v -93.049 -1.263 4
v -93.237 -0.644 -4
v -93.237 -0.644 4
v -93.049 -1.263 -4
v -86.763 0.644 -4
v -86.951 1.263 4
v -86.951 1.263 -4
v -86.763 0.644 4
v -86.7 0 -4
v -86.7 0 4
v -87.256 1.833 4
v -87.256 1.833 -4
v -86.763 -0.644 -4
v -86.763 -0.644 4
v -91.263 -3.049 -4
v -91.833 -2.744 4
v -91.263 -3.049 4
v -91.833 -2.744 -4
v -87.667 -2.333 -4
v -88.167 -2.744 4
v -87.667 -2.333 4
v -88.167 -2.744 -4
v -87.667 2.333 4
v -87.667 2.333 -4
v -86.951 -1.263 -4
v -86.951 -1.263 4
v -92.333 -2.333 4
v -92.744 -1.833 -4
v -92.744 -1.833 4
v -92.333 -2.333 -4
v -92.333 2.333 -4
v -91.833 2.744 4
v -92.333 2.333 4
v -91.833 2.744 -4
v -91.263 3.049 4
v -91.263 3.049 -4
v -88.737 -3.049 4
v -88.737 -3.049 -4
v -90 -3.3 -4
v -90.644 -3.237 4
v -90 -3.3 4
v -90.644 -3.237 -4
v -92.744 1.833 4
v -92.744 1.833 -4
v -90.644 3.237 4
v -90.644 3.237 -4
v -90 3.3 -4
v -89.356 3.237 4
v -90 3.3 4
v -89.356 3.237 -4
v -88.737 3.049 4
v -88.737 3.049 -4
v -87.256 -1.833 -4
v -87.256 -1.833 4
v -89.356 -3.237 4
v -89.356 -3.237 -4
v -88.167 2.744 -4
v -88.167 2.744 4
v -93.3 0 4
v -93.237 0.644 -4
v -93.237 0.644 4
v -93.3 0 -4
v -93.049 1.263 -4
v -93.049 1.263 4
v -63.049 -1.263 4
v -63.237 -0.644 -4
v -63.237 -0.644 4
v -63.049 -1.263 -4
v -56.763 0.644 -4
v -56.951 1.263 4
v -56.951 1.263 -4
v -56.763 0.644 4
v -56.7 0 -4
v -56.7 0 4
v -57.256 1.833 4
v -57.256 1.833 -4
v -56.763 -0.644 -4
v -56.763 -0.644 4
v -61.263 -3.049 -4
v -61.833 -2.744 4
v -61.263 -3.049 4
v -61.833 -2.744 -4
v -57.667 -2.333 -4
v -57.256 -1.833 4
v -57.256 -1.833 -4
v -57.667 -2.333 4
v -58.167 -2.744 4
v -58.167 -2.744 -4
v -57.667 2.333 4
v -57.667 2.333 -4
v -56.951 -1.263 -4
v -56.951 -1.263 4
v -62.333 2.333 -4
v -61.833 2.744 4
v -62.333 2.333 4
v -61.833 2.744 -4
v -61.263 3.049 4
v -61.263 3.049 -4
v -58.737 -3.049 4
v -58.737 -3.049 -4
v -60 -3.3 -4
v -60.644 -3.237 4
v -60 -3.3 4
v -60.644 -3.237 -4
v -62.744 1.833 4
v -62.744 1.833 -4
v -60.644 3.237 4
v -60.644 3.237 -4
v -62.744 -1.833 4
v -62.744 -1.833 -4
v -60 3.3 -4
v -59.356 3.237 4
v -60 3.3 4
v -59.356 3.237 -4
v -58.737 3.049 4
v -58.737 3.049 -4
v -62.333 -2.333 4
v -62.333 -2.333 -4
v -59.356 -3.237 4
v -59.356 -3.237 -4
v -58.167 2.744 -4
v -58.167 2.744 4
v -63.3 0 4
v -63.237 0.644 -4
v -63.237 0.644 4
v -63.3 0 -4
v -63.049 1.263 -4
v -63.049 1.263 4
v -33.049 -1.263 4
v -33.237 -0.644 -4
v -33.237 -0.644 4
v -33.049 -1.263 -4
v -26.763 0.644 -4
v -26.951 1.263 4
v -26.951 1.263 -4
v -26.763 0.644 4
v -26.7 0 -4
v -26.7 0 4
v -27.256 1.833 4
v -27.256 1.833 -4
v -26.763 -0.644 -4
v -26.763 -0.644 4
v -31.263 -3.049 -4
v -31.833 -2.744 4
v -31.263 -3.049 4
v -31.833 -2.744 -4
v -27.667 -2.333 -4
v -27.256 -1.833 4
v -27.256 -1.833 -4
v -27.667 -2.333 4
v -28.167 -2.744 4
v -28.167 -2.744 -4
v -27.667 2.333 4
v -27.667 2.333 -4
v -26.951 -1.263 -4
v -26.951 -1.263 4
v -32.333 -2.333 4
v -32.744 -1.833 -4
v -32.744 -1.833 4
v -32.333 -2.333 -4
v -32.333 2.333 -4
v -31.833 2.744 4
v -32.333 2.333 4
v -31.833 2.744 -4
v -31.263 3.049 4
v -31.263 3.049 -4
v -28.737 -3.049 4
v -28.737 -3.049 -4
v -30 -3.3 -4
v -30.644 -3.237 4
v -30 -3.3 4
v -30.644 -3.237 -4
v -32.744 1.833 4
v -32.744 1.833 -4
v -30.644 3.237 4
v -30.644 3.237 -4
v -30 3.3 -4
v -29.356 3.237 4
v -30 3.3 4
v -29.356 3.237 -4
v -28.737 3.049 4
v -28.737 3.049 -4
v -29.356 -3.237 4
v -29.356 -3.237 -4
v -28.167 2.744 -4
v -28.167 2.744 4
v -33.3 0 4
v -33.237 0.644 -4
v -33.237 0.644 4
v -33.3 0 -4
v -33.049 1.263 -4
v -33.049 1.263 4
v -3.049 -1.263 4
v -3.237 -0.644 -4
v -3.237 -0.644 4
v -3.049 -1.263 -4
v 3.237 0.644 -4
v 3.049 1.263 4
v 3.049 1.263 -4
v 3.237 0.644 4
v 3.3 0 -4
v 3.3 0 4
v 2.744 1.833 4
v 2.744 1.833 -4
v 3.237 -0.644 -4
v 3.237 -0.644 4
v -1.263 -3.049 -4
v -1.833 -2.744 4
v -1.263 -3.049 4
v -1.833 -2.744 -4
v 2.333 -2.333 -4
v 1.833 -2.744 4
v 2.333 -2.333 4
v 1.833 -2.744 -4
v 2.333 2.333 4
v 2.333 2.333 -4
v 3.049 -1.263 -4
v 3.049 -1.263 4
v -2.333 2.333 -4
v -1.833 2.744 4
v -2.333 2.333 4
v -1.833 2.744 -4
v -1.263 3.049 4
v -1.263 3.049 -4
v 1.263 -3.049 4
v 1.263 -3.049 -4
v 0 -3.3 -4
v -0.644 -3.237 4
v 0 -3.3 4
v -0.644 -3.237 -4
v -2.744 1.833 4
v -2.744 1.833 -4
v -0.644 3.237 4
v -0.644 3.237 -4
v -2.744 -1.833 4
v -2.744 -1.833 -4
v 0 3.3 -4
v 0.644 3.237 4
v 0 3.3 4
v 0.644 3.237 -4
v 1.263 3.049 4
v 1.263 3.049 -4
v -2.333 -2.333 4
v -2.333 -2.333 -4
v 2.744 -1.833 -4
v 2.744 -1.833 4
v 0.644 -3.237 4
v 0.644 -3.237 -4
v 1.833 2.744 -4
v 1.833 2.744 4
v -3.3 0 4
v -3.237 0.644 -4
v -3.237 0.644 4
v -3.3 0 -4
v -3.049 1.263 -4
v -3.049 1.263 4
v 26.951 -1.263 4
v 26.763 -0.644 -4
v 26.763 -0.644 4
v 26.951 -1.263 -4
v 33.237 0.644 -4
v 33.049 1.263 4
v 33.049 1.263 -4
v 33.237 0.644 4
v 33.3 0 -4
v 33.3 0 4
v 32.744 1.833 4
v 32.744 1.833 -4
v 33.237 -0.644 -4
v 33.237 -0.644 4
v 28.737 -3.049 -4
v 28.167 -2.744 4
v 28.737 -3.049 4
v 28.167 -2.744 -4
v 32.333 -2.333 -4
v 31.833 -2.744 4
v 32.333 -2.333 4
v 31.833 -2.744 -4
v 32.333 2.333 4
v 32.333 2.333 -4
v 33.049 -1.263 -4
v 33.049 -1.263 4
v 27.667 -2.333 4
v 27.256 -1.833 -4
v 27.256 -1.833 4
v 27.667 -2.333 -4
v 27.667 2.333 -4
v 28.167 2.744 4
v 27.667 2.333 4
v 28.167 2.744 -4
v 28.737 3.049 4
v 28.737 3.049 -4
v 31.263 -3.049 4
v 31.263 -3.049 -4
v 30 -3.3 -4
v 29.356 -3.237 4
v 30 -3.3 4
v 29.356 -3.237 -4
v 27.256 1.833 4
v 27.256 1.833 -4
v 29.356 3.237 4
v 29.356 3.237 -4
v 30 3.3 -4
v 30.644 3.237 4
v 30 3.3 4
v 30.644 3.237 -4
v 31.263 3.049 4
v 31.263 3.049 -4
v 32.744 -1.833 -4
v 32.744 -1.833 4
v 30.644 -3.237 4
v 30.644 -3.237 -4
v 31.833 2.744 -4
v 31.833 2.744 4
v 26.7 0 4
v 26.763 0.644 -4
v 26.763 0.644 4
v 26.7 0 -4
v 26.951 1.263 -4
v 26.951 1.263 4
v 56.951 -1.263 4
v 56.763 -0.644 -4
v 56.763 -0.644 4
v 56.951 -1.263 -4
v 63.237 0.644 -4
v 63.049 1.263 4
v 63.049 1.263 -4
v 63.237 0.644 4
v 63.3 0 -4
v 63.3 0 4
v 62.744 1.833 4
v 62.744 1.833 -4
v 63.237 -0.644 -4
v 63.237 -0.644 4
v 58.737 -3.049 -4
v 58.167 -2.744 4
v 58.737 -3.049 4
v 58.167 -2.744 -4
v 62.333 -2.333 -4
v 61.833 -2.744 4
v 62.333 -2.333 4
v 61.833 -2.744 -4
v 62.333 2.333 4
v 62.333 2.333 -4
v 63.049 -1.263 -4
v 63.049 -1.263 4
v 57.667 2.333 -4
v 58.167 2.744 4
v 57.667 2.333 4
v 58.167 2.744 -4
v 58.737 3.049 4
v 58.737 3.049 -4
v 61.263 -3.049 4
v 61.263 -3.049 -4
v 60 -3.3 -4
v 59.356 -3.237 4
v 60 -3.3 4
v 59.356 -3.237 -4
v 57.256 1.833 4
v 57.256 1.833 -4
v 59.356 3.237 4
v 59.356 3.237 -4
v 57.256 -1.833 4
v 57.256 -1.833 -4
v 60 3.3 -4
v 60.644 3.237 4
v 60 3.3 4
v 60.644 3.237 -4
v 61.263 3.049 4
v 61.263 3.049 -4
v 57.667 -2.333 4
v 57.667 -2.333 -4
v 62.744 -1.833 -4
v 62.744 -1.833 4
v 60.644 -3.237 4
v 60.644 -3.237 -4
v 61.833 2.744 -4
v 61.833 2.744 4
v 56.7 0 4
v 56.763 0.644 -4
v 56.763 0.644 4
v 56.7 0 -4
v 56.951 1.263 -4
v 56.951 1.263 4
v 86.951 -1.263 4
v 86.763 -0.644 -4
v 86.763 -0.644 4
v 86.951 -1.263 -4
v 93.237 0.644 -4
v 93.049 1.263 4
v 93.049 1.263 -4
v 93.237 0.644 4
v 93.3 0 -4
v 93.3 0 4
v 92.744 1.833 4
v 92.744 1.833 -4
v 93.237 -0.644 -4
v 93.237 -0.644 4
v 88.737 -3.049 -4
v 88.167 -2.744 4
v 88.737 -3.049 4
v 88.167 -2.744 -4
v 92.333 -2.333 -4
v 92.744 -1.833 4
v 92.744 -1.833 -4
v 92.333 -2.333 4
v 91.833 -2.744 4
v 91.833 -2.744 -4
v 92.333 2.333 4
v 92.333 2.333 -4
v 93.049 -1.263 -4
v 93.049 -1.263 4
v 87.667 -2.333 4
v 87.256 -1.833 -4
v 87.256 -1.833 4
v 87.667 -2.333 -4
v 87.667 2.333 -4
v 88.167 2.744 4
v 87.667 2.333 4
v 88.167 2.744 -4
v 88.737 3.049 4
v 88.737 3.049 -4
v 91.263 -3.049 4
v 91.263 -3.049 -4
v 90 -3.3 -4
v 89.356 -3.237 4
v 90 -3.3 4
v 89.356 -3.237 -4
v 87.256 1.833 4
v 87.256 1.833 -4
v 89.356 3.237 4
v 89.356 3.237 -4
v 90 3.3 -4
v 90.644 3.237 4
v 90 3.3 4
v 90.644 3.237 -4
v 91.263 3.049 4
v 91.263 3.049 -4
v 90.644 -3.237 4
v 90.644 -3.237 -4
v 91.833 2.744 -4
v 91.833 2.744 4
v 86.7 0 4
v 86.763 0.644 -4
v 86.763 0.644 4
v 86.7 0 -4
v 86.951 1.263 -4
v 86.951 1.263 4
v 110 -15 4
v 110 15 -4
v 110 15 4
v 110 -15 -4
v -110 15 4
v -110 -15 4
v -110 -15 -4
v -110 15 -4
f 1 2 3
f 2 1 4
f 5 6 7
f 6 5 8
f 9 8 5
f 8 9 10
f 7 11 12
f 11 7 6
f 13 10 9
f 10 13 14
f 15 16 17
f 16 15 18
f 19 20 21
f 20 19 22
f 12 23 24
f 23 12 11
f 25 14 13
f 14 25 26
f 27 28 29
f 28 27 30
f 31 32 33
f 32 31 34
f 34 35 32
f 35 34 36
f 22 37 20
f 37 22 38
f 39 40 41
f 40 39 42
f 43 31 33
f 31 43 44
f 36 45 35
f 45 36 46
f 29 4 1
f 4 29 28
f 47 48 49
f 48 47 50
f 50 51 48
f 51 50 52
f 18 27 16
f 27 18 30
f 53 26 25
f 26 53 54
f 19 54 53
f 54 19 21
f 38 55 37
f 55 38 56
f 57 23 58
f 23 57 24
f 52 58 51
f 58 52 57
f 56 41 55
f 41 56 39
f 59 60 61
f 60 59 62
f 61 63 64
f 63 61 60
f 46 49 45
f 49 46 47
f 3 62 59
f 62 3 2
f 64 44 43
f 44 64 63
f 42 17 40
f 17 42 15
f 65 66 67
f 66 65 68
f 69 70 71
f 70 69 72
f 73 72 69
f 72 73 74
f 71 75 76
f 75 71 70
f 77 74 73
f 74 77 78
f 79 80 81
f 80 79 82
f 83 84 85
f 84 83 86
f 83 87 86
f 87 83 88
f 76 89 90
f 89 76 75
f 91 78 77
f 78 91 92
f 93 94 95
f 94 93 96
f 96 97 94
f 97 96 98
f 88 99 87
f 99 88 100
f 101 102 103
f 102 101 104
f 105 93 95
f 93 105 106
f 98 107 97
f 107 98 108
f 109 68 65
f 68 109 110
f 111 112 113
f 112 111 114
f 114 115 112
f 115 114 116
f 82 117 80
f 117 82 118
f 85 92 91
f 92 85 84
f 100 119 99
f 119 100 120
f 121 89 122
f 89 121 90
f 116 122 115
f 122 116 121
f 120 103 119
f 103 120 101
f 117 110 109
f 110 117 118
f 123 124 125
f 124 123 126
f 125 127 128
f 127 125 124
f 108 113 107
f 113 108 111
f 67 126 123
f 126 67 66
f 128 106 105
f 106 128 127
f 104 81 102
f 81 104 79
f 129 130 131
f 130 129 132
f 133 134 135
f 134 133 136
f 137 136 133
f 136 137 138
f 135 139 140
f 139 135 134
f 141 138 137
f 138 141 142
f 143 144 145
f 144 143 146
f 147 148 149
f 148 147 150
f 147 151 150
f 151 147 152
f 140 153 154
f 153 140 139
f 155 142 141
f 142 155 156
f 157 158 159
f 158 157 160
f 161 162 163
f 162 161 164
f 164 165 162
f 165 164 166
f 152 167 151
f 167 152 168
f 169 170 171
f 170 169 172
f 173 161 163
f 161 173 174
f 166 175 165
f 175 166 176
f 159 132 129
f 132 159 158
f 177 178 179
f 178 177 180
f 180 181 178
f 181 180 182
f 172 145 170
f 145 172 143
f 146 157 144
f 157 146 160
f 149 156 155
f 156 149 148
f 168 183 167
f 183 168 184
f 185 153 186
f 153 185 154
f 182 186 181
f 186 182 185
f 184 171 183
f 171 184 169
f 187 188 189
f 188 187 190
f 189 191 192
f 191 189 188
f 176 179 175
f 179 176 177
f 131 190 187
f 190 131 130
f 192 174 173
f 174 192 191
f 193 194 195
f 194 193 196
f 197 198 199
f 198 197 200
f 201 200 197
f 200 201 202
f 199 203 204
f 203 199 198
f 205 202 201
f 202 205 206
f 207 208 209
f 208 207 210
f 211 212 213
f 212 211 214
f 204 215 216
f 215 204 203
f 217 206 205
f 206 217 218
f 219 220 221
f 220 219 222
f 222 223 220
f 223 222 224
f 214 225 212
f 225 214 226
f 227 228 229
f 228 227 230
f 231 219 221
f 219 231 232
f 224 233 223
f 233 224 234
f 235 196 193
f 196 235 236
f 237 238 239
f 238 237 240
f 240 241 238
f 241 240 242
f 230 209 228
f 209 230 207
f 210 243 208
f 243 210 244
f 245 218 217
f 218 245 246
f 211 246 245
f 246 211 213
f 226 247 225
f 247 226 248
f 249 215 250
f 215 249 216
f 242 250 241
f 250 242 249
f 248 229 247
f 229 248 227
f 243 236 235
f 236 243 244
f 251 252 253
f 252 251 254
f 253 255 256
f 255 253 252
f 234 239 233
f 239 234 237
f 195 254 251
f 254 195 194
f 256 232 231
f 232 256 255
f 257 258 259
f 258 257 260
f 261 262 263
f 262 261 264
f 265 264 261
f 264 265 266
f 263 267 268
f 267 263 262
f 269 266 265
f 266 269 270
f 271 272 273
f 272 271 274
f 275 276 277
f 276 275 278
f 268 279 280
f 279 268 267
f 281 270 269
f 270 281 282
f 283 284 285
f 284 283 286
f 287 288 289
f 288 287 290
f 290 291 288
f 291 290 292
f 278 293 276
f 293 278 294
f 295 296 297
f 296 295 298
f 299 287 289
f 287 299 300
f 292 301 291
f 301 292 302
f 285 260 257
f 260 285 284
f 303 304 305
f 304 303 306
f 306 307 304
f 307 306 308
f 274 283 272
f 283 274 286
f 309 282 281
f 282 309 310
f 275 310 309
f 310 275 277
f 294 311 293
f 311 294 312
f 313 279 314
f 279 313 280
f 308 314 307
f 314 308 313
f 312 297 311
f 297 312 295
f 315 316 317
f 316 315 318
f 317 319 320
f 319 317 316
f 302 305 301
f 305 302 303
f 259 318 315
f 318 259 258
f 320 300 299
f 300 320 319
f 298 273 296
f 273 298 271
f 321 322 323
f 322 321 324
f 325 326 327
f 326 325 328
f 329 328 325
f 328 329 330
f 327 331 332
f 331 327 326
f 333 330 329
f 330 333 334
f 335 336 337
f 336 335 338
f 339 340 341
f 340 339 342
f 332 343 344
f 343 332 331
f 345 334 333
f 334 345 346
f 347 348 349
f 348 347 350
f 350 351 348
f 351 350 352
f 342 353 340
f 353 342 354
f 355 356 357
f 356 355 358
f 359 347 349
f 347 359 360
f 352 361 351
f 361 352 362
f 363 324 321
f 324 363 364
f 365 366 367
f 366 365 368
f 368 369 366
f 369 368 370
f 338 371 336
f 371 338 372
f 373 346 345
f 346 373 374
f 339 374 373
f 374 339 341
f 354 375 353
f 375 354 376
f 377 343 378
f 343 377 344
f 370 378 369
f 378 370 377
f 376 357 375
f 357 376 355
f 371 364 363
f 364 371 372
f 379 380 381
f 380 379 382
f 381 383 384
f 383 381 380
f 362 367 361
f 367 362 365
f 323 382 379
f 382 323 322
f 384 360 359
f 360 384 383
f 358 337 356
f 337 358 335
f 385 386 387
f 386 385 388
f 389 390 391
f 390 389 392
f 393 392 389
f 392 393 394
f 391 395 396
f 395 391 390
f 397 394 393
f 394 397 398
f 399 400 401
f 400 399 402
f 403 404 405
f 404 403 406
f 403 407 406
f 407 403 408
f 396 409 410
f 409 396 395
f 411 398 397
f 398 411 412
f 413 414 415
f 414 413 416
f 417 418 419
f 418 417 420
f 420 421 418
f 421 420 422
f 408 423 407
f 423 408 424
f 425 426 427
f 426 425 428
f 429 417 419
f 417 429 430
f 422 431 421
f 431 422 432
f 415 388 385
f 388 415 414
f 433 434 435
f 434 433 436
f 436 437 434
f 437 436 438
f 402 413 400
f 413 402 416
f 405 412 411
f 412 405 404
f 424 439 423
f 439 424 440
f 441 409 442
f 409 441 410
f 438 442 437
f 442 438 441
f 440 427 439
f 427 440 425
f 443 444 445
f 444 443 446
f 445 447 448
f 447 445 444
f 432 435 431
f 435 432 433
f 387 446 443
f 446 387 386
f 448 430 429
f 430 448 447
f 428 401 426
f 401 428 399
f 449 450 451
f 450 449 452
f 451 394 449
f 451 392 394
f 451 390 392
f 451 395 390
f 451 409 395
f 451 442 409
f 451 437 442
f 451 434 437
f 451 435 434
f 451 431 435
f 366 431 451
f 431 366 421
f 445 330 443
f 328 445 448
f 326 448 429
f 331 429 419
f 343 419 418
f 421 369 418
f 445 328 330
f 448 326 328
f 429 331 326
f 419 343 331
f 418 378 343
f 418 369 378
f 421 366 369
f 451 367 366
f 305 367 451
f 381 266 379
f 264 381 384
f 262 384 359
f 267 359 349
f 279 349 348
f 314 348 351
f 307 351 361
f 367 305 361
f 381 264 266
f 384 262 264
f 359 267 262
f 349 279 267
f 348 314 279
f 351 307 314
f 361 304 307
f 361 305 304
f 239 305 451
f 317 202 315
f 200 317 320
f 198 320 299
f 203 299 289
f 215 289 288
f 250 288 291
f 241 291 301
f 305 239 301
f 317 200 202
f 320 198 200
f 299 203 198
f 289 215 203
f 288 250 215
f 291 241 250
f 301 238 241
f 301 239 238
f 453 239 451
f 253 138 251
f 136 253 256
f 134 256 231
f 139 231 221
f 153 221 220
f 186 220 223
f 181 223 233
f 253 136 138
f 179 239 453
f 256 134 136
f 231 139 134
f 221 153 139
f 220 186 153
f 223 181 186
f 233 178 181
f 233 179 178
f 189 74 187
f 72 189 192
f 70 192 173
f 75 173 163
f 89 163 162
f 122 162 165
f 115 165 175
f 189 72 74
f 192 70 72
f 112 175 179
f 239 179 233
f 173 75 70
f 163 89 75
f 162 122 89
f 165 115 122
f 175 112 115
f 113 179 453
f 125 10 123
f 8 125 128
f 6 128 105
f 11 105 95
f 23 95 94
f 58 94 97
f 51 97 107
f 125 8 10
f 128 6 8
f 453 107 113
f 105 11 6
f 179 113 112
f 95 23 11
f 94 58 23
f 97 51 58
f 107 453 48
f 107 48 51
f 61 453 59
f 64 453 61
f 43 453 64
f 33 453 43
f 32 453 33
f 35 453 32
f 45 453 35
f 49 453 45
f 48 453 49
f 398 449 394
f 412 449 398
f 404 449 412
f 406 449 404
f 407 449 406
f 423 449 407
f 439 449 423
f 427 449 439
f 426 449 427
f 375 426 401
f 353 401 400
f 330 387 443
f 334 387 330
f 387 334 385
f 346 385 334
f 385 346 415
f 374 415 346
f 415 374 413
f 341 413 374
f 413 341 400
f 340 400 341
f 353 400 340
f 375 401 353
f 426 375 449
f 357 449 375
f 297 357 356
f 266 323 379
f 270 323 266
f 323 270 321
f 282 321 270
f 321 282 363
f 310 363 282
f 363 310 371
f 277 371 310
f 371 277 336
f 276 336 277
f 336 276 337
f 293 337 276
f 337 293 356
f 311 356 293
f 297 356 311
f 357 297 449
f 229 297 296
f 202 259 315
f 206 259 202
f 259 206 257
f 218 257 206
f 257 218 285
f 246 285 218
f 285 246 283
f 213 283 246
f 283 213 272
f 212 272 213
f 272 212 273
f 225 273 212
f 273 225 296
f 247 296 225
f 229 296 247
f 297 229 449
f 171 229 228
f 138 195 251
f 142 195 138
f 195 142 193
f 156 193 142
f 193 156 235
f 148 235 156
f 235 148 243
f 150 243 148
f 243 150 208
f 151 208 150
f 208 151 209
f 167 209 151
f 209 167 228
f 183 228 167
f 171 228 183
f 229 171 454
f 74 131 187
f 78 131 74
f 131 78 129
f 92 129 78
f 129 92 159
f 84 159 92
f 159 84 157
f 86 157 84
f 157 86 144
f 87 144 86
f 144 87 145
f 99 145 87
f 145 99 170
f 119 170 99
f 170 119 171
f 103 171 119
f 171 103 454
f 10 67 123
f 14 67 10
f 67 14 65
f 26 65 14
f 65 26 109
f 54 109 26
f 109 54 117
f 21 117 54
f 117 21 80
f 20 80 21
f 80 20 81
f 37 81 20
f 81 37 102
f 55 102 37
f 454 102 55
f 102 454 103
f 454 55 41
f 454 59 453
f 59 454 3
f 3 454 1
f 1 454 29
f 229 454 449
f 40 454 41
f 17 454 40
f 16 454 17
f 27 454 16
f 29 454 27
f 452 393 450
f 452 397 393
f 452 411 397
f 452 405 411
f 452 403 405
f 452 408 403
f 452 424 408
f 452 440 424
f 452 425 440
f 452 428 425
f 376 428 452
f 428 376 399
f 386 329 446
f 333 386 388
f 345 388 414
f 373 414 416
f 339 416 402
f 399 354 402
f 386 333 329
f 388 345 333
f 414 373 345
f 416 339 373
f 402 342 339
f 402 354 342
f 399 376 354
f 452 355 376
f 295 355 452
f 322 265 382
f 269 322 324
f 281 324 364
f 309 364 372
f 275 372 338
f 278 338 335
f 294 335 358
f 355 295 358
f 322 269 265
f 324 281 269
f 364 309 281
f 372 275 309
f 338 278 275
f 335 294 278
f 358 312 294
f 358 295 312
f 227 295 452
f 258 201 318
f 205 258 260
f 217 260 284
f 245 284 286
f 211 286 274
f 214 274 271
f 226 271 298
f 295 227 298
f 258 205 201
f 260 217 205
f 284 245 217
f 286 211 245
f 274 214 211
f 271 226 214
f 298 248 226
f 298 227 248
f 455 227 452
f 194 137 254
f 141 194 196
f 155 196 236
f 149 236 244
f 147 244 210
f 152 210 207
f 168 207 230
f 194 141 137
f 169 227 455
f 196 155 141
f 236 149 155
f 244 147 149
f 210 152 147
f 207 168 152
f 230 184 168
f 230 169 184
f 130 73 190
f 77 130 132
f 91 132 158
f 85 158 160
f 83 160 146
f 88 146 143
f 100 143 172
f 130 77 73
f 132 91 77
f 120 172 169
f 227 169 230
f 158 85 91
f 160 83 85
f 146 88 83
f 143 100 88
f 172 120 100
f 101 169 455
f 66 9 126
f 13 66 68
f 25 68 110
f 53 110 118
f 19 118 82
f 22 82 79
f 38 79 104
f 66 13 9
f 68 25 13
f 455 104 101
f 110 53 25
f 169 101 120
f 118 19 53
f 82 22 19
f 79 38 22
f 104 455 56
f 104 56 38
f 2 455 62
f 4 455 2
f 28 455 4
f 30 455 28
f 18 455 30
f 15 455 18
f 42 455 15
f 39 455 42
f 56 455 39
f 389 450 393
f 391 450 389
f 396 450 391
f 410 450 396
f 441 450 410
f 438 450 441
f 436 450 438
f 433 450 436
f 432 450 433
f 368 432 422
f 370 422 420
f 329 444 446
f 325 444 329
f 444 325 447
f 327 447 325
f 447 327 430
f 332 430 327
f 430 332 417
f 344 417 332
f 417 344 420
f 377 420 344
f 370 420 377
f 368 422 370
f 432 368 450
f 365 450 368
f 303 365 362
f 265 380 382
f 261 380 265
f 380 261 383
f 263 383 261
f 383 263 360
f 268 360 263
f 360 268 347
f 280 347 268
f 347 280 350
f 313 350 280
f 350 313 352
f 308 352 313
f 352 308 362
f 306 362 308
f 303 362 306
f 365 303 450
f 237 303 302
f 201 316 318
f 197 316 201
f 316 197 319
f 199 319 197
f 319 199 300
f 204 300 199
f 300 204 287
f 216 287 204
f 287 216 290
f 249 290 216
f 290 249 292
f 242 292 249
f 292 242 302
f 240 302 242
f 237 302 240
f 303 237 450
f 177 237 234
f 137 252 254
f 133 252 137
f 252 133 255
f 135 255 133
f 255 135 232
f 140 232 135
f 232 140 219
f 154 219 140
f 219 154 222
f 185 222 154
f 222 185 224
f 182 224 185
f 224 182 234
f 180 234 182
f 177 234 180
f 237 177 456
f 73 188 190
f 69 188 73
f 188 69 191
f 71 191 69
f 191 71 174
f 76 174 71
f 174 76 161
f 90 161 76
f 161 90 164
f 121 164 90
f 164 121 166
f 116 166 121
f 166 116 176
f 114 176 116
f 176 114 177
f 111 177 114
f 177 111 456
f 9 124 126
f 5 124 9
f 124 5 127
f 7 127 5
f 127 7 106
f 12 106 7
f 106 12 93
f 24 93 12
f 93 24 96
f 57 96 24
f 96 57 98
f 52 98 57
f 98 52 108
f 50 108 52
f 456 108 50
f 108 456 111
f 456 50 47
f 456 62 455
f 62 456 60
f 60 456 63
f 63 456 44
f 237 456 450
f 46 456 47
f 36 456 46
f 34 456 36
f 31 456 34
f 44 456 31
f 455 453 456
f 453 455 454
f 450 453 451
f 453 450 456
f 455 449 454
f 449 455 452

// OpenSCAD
$fn = 32;

// ----------------------------------------------------------------------
// Hole bar, 7 x Ø6.6
// row layout, 20 mm edge offset
// ----------------------------------------------------------------------

// --- parameters (mm) ---
bar_w = 30;       // bar width (Y)
seat_tol = 0.15;  // tolerance at the seating features
free_tol = 0.5;   // general tolerance on the free sizes
bar_t = 8;        // bar thickness (Z)
holes = 7;        // holes per row
hole_d = 6.6;     // hole diameter
edge = 20;        // offset from the bar end to the first hole
pitch = 30;       // pitch between neighbouring holes

// --- derived feature positions (mm) ---
span = (holes - 1) * pitch;   // = 180   distance between the end holes
bar_l = span + 2 * edge;      // = 220   overall bar length
start_x = -bar_l / 2 + edge;  // = -90   X of the first hole
feature_centers = [
  [start_x + 0 * pitch, 0],
  [start_x + 1 * pitch, 0],
  [start_x + 2 * pitch, 0],
  [start_x + 3 * pitch, 0],
  [start_x + 4 * pitch, 0],
  [start_x + 5 * pitch, 0],
  [start_x + 6 * pitch, 0]
];   // hole centres of the first row

// bar with one row of holes, drilled from feature_centers
difference() {
  translate([-bar_l / 2, -bar_w / 2, -bar_t / 2]) cube([bar_l, bar_w, bar_t]);
  for (centre = feature_centers)
    translate([centre[0], centre[1], 0])
      cylinder(d = hole_d, h = bar_t + 2, center = true);
}
